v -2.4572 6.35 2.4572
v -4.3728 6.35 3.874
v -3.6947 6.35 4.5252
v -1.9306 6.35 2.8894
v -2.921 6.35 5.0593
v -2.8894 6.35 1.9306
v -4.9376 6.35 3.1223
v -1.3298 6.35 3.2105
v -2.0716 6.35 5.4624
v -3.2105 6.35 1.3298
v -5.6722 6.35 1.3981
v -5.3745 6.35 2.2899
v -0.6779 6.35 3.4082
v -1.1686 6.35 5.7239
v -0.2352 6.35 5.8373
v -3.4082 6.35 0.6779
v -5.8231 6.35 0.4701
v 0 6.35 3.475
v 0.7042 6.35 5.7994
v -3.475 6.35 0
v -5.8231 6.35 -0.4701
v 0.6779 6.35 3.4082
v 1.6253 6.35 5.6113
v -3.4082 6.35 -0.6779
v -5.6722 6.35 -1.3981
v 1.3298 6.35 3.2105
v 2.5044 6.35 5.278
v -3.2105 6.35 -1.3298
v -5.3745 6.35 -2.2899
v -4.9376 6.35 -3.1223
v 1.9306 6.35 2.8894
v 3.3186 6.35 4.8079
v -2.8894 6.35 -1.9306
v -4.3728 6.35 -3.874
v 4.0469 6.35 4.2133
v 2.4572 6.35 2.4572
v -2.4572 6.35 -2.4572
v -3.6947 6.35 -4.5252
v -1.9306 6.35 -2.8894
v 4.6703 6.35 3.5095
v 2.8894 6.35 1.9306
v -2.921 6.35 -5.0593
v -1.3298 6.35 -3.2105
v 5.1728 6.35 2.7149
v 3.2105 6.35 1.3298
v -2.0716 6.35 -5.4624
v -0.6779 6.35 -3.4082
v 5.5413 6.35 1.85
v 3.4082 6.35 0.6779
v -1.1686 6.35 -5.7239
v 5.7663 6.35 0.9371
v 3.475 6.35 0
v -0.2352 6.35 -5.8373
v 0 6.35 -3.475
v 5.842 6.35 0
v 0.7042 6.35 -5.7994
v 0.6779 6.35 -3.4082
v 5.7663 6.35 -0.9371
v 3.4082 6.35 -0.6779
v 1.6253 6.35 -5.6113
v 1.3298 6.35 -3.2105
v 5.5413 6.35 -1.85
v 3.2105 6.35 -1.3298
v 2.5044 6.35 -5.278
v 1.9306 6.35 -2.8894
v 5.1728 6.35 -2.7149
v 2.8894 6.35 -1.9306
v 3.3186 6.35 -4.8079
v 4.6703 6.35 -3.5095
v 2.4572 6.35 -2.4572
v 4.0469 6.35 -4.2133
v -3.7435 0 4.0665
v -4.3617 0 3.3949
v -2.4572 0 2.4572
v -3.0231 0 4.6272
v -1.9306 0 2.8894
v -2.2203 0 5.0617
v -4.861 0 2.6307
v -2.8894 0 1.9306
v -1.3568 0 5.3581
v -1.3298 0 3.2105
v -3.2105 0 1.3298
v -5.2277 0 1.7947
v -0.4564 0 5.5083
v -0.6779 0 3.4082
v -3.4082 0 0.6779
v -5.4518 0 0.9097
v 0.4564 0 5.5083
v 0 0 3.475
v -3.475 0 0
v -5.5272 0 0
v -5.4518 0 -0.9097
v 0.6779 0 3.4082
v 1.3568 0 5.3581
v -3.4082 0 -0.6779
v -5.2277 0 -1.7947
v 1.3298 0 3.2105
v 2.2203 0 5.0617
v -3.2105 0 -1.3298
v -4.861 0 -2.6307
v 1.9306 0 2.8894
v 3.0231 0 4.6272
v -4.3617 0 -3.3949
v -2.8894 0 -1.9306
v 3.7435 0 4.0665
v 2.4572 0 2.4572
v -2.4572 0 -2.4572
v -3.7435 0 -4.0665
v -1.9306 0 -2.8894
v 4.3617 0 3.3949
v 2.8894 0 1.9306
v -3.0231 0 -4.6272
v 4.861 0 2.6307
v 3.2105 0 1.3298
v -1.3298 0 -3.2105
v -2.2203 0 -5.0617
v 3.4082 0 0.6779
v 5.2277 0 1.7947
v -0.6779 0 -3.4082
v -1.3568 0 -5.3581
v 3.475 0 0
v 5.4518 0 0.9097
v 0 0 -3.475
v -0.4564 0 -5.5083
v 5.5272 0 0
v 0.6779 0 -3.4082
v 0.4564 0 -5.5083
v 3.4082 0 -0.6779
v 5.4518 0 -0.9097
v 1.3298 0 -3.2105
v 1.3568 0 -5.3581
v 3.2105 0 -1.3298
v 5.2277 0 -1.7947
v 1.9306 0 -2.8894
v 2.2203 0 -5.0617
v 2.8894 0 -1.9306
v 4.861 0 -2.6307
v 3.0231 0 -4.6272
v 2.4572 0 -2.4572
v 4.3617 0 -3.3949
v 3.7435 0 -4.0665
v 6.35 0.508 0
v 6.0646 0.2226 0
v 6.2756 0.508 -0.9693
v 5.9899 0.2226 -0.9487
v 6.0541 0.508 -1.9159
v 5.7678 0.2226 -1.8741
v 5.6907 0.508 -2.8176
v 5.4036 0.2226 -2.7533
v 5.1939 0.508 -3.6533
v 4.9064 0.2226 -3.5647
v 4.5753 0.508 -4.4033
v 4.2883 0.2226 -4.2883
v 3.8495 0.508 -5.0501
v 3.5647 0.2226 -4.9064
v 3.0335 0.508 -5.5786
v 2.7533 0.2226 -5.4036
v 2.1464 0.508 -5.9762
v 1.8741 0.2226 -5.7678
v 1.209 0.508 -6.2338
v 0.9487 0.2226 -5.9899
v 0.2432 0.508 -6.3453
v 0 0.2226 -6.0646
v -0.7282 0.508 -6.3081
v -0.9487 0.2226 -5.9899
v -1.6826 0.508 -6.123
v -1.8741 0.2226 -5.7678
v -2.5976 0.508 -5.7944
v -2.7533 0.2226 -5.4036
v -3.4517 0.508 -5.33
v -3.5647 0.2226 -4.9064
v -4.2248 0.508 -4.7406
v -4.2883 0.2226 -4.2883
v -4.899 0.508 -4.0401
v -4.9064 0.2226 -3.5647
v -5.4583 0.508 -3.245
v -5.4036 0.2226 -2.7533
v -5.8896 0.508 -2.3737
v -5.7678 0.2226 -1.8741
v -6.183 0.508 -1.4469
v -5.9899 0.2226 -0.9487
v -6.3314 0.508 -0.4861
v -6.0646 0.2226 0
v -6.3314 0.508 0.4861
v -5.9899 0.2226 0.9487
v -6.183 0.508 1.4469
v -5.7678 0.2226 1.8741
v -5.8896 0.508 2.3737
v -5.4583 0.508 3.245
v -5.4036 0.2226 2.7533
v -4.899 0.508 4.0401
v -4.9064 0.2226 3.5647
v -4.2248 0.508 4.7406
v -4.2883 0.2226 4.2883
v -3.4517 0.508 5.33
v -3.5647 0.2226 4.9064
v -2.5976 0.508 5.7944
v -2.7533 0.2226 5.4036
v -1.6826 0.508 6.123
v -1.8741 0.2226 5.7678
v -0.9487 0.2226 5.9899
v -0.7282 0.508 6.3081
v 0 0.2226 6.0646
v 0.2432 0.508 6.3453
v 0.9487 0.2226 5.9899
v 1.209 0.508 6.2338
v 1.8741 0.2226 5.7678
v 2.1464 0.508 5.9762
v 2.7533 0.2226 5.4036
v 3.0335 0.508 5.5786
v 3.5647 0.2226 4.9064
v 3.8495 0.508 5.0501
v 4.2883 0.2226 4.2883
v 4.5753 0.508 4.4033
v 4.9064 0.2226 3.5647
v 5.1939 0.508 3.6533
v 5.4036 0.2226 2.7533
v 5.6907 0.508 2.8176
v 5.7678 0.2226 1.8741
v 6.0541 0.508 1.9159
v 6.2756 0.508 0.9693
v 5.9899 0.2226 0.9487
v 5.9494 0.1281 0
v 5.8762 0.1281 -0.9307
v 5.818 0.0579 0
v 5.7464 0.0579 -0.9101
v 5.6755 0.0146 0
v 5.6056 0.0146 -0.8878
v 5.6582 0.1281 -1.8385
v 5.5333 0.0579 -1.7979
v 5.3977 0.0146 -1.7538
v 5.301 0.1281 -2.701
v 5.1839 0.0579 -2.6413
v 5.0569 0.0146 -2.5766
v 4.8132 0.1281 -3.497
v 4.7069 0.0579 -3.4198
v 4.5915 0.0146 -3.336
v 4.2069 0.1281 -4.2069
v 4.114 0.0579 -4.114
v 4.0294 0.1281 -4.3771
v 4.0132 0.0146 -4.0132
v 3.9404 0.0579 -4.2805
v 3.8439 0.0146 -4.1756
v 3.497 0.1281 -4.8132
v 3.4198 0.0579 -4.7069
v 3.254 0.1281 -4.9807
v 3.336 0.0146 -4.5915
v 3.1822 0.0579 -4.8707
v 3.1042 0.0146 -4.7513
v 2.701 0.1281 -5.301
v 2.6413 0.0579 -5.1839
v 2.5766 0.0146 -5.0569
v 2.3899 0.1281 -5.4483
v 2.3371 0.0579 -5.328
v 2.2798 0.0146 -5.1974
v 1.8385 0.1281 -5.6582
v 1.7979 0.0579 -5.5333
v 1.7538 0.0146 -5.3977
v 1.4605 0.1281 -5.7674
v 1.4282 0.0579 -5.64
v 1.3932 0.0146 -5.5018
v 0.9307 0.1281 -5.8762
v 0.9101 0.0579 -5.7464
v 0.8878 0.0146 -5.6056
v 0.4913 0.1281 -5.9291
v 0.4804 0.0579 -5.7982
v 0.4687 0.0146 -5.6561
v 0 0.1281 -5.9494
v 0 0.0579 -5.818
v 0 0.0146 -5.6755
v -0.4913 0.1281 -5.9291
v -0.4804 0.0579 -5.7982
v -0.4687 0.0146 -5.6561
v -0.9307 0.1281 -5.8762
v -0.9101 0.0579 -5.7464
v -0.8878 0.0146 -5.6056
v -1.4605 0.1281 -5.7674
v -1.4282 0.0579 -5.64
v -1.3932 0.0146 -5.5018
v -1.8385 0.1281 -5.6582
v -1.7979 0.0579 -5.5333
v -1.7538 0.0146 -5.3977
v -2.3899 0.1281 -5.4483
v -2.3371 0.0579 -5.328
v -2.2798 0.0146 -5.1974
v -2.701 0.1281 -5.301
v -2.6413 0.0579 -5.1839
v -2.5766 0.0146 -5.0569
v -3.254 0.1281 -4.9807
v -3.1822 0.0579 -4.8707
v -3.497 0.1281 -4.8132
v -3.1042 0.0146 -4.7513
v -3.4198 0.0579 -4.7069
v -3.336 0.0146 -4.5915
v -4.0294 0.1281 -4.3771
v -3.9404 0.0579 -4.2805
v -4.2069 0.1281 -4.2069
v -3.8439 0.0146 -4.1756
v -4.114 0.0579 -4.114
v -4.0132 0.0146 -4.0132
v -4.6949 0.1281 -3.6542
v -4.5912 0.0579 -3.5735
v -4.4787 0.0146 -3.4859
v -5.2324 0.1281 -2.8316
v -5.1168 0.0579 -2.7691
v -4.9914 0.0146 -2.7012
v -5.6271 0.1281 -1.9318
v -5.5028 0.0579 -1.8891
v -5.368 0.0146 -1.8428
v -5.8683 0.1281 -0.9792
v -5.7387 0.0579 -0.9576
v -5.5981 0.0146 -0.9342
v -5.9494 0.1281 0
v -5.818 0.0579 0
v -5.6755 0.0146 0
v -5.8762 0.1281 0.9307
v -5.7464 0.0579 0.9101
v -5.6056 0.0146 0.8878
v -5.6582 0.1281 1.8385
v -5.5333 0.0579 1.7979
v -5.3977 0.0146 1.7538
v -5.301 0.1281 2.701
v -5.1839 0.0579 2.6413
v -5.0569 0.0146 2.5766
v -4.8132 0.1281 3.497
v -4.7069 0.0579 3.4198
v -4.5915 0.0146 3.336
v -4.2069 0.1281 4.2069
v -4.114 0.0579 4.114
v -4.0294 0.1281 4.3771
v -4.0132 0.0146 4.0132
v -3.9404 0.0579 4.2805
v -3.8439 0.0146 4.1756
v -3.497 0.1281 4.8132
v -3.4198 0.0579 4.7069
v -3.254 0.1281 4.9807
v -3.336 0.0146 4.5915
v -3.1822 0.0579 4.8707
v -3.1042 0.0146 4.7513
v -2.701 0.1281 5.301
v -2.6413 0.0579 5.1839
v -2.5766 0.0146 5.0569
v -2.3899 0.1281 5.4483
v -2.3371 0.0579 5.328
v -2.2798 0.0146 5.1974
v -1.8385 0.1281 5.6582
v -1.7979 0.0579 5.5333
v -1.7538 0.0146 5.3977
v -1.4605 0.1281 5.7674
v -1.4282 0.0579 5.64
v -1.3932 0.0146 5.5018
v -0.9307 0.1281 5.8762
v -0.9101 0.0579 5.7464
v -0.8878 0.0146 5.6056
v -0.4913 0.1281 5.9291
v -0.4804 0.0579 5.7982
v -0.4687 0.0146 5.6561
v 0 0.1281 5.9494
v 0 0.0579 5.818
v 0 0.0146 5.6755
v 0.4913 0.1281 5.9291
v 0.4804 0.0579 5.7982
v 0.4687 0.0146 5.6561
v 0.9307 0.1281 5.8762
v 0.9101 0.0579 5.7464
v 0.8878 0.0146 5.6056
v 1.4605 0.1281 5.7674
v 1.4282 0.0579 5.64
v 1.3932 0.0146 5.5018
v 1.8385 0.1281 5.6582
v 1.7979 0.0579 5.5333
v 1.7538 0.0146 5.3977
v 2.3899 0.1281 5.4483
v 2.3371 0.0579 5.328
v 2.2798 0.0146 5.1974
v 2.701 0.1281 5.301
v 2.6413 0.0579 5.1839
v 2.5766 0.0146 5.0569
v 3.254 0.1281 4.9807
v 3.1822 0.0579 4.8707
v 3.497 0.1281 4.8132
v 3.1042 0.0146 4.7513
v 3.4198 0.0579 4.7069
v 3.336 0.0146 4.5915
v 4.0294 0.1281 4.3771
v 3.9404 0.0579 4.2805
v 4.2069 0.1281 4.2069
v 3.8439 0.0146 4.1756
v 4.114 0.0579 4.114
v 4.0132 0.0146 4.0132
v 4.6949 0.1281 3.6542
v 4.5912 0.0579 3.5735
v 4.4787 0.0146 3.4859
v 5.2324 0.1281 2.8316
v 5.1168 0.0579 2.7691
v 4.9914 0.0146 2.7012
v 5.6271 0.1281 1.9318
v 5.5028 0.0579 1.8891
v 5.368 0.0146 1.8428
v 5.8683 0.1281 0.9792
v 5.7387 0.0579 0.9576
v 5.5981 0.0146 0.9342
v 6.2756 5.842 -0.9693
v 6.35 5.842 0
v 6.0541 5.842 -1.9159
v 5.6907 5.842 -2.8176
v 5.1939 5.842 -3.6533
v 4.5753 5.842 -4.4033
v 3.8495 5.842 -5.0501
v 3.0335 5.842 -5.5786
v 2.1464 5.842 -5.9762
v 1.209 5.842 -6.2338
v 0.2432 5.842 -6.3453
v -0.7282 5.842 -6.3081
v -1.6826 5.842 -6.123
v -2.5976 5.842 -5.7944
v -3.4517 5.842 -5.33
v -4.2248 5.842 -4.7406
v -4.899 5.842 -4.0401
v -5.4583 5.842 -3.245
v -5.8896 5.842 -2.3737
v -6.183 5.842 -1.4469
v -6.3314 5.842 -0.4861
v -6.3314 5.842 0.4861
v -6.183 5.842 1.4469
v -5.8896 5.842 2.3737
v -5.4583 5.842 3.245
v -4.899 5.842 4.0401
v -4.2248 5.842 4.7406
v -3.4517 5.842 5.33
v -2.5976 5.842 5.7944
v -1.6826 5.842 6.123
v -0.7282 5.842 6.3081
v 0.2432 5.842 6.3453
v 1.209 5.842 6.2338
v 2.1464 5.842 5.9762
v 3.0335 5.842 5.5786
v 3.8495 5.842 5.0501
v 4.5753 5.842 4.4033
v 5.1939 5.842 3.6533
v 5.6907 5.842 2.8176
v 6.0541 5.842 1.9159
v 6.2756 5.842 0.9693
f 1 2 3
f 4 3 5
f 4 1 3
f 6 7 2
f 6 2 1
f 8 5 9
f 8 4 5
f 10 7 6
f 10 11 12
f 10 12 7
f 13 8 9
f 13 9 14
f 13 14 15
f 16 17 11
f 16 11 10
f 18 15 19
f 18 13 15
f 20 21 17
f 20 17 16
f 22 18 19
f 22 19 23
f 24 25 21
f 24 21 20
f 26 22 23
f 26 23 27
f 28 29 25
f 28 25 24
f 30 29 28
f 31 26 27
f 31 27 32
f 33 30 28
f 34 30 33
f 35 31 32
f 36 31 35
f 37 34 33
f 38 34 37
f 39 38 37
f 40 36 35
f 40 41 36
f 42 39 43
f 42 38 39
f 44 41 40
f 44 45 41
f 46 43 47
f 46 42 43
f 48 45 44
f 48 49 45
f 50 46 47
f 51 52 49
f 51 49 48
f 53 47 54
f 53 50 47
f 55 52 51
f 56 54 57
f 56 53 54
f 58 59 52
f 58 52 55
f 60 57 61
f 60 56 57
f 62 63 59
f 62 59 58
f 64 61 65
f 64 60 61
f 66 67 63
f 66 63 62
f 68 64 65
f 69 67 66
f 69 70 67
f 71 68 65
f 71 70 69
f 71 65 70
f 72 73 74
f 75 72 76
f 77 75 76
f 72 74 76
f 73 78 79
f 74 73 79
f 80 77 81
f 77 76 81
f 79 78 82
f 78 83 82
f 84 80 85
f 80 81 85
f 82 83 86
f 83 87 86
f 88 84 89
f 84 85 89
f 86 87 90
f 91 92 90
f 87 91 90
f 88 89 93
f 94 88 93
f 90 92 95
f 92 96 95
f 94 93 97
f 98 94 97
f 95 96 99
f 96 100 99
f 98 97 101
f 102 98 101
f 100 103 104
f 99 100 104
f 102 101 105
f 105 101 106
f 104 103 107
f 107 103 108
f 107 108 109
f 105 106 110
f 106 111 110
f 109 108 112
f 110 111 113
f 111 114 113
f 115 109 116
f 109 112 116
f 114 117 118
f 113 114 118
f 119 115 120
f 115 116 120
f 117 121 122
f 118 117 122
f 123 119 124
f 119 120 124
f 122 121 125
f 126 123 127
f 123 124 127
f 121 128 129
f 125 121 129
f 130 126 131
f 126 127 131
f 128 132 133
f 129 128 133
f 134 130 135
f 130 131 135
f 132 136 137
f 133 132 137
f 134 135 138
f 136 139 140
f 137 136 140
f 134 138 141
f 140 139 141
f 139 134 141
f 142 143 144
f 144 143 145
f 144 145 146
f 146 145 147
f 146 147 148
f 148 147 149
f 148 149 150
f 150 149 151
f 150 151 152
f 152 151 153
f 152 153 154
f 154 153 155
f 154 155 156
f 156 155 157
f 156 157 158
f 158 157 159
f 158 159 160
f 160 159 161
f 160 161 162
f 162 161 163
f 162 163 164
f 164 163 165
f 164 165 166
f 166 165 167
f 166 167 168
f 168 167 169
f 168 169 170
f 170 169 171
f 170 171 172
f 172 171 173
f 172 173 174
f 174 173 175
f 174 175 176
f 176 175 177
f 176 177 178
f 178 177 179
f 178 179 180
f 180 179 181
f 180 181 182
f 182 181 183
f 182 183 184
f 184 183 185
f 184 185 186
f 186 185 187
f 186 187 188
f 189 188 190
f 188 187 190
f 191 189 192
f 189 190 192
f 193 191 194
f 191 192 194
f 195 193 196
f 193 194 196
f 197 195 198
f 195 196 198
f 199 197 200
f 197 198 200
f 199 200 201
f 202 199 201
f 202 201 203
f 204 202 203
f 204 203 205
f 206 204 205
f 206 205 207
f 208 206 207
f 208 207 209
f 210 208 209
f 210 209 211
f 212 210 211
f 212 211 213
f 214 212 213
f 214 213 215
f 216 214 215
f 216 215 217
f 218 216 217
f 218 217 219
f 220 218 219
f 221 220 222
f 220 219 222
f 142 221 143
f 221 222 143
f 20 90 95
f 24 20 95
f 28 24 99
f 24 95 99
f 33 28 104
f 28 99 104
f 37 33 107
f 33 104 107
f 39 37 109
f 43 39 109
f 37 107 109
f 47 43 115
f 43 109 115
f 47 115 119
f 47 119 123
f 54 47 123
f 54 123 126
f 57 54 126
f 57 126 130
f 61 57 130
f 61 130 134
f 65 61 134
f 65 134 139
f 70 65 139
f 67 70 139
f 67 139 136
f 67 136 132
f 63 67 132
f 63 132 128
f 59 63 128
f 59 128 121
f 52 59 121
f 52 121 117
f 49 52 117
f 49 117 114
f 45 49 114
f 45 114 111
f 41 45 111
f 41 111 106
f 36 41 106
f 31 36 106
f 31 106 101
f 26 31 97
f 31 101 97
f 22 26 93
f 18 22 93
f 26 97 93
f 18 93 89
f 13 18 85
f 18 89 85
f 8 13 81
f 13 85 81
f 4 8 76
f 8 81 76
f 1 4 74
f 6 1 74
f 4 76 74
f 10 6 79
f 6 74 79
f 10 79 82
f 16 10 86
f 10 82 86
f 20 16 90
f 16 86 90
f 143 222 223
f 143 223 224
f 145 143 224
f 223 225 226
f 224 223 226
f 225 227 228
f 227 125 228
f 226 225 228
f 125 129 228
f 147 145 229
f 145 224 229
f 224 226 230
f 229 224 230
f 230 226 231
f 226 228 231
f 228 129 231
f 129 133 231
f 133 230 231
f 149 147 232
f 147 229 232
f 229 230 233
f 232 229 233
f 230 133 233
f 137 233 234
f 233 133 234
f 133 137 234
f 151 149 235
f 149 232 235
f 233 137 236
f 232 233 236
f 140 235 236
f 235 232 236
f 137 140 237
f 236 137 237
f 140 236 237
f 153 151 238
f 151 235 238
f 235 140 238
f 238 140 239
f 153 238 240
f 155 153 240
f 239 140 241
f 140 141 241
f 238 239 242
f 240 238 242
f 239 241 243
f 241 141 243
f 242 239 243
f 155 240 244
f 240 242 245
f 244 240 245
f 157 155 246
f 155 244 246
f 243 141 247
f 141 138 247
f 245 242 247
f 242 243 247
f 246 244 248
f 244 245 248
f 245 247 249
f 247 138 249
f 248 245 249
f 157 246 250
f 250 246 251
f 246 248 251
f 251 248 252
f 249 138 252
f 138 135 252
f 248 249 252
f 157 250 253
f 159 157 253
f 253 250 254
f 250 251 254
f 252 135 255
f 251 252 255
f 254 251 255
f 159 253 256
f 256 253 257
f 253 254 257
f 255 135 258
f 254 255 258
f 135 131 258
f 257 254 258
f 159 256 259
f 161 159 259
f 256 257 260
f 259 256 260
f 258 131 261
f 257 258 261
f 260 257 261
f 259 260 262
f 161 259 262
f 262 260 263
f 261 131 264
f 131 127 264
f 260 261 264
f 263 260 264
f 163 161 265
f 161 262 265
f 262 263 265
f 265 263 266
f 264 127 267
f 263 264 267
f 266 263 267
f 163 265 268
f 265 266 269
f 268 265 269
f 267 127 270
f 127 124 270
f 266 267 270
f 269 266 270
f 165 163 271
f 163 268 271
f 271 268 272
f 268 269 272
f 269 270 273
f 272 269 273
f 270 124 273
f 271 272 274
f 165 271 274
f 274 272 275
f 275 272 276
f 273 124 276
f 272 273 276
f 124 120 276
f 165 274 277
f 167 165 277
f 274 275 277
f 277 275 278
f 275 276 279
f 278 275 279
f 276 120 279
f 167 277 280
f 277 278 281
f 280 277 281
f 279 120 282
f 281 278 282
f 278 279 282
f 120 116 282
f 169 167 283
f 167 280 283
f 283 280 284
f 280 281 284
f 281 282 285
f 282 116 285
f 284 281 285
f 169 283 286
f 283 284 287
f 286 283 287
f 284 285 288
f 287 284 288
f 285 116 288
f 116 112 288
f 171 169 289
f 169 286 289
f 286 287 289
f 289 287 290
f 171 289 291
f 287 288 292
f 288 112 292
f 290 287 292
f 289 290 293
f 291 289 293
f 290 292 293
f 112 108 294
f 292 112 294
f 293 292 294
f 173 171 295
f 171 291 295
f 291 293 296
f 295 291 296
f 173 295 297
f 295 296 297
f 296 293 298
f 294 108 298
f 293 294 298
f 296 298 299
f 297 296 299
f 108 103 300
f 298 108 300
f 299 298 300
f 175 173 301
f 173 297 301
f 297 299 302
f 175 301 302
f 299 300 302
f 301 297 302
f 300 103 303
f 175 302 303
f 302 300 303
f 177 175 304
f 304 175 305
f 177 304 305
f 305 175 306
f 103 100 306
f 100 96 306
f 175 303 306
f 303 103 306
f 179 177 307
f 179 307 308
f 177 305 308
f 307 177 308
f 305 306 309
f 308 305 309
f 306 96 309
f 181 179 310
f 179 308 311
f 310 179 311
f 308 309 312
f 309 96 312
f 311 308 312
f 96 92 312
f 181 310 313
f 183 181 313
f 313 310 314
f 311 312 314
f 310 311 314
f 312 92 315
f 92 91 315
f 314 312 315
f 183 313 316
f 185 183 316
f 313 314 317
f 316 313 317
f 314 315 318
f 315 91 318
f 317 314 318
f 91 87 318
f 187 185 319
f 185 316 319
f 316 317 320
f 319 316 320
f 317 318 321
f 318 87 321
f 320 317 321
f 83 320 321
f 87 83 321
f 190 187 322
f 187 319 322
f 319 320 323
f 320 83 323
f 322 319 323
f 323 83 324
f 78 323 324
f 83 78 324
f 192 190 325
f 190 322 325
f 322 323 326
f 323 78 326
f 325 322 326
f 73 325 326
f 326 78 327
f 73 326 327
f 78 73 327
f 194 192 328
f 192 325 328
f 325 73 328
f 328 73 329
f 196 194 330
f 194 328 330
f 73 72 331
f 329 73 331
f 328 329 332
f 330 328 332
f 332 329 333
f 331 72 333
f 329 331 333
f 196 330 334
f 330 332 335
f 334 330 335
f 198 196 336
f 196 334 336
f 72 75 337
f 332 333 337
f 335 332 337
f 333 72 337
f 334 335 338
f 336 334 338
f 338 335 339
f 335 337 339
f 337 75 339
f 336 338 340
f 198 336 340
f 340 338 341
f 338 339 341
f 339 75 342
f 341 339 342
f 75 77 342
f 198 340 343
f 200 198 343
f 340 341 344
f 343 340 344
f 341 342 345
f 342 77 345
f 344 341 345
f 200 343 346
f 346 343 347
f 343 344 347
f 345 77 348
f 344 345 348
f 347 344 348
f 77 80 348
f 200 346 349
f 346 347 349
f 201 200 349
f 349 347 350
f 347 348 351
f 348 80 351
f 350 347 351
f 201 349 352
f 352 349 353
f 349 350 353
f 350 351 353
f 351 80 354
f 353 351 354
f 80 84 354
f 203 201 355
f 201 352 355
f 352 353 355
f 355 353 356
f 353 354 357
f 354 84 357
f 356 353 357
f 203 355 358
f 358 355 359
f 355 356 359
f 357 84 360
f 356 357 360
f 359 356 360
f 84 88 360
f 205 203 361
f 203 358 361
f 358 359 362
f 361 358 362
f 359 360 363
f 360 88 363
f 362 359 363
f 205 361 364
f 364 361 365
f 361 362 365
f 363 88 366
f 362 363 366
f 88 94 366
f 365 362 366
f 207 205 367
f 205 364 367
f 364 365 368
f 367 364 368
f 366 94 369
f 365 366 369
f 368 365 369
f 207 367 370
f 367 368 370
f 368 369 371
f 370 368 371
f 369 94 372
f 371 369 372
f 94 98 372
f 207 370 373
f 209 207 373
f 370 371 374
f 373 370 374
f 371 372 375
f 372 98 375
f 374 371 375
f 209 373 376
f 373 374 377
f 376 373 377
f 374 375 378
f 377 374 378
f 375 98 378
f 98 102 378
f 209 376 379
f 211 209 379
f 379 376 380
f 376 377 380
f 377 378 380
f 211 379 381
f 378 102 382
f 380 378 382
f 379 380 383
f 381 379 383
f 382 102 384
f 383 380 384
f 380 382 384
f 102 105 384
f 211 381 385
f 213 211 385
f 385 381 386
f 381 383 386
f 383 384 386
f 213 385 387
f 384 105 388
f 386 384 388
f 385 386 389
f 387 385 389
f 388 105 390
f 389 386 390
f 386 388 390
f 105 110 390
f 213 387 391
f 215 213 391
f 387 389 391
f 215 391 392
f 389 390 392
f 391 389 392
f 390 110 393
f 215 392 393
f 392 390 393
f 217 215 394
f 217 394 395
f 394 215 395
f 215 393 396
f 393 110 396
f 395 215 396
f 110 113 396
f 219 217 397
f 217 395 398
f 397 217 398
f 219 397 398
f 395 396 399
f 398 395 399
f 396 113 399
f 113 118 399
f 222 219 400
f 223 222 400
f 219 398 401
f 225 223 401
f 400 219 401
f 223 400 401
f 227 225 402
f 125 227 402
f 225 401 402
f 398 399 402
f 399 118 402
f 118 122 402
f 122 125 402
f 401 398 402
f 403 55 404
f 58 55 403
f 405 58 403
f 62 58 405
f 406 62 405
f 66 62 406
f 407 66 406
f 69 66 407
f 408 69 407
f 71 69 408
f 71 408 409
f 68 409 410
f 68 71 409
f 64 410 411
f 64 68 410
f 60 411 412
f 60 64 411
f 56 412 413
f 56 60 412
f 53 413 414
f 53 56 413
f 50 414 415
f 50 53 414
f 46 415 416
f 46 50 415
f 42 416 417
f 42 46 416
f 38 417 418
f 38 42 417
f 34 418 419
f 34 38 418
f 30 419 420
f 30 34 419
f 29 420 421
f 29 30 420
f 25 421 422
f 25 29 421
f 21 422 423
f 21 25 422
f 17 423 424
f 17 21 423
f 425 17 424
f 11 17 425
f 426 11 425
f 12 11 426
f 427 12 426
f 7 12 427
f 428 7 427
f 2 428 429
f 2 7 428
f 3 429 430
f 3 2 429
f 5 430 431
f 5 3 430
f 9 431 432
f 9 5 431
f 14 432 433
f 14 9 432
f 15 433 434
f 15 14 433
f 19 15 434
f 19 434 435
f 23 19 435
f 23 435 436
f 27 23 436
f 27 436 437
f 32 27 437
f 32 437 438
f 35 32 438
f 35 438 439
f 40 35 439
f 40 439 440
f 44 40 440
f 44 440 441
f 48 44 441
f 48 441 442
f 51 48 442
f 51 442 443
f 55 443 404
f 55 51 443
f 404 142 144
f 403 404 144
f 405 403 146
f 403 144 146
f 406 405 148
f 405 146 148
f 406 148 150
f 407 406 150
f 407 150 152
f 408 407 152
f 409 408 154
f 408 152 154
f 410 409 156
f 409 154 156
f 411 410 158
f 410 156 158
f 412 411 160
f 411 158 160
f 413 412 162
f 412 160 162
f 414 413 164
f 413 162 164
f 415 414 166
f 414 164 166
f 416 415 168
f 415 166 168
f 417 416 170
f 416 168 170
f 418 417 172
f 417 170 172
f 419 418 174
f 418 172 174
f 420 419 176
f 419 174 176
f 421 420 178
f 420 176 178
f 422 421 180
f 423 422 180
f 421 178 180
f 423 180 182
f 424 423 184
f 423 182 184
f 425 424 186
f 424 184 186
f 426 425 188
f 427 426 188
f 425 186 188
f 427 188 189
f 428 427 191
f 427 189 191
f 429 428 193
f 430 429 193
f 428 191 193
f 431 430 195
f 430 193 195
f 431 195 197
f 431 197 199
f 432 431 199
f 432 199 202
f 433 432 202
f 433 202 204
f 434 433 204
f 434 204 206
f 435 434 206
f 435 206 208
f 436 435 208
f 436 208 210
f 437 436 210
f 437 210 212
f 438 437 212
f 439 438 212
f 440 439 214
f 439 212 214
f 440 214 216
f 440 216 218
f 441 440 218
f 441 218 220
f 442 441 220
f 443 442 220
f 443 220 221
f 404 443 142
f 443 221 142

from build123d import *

# Parameters (mm, degrees)
SKETCH1_R                   = 6.35
BOSS_EXTRUDE1_DEPTH         = 6.35
F_1_4_0_25_DIAMETER_HOLE1_D = 6.95000007
CHAMFER1_SIZE               = 0.508
FILLET1_R                   = 0.76


with BuildPart() as part:
    # Sketch1 → Boss-Extrude1 (new body)
    with BuildSketch(Plane(origin=(0, 0, 0), x_dir=(1, 0, 0), z_dir=(0, 1, 0))):
        Circle(SKETCH1_R)
    extrude(amount=BOSS_EXTRUDE1_DEPTH)

    # 1/4 (0.25) Diameter Hole1 (through all)
    with Locations(Plane(origin=(0, 6.35, 0), x_dir=(1, 0, 0), z_dir=(0, 1, 0))):
        with Locations((0, 0)):
            Hole(F_1_4_0_25_DIAMETER_HOLE1_D / 2)

    # Chamfer1
    chamfer1_edges = [part.edges().sort_by_distance(p)[0] for p in [
        (-6.35, 0, 0),
        (-6.35, 6.35, 0),
    ]]
    chamfer(chamfer1_edges, length=CHAMFER1_SIZE)

    # Fillet1
    fillet1_edges = [part.edges().sort_by_distance(p)[0] for p in [
        (-5.842, 0, 0),
    ]]
    fillet(fillet1_edges, radius=FILLET1_R)


solid = part.part
